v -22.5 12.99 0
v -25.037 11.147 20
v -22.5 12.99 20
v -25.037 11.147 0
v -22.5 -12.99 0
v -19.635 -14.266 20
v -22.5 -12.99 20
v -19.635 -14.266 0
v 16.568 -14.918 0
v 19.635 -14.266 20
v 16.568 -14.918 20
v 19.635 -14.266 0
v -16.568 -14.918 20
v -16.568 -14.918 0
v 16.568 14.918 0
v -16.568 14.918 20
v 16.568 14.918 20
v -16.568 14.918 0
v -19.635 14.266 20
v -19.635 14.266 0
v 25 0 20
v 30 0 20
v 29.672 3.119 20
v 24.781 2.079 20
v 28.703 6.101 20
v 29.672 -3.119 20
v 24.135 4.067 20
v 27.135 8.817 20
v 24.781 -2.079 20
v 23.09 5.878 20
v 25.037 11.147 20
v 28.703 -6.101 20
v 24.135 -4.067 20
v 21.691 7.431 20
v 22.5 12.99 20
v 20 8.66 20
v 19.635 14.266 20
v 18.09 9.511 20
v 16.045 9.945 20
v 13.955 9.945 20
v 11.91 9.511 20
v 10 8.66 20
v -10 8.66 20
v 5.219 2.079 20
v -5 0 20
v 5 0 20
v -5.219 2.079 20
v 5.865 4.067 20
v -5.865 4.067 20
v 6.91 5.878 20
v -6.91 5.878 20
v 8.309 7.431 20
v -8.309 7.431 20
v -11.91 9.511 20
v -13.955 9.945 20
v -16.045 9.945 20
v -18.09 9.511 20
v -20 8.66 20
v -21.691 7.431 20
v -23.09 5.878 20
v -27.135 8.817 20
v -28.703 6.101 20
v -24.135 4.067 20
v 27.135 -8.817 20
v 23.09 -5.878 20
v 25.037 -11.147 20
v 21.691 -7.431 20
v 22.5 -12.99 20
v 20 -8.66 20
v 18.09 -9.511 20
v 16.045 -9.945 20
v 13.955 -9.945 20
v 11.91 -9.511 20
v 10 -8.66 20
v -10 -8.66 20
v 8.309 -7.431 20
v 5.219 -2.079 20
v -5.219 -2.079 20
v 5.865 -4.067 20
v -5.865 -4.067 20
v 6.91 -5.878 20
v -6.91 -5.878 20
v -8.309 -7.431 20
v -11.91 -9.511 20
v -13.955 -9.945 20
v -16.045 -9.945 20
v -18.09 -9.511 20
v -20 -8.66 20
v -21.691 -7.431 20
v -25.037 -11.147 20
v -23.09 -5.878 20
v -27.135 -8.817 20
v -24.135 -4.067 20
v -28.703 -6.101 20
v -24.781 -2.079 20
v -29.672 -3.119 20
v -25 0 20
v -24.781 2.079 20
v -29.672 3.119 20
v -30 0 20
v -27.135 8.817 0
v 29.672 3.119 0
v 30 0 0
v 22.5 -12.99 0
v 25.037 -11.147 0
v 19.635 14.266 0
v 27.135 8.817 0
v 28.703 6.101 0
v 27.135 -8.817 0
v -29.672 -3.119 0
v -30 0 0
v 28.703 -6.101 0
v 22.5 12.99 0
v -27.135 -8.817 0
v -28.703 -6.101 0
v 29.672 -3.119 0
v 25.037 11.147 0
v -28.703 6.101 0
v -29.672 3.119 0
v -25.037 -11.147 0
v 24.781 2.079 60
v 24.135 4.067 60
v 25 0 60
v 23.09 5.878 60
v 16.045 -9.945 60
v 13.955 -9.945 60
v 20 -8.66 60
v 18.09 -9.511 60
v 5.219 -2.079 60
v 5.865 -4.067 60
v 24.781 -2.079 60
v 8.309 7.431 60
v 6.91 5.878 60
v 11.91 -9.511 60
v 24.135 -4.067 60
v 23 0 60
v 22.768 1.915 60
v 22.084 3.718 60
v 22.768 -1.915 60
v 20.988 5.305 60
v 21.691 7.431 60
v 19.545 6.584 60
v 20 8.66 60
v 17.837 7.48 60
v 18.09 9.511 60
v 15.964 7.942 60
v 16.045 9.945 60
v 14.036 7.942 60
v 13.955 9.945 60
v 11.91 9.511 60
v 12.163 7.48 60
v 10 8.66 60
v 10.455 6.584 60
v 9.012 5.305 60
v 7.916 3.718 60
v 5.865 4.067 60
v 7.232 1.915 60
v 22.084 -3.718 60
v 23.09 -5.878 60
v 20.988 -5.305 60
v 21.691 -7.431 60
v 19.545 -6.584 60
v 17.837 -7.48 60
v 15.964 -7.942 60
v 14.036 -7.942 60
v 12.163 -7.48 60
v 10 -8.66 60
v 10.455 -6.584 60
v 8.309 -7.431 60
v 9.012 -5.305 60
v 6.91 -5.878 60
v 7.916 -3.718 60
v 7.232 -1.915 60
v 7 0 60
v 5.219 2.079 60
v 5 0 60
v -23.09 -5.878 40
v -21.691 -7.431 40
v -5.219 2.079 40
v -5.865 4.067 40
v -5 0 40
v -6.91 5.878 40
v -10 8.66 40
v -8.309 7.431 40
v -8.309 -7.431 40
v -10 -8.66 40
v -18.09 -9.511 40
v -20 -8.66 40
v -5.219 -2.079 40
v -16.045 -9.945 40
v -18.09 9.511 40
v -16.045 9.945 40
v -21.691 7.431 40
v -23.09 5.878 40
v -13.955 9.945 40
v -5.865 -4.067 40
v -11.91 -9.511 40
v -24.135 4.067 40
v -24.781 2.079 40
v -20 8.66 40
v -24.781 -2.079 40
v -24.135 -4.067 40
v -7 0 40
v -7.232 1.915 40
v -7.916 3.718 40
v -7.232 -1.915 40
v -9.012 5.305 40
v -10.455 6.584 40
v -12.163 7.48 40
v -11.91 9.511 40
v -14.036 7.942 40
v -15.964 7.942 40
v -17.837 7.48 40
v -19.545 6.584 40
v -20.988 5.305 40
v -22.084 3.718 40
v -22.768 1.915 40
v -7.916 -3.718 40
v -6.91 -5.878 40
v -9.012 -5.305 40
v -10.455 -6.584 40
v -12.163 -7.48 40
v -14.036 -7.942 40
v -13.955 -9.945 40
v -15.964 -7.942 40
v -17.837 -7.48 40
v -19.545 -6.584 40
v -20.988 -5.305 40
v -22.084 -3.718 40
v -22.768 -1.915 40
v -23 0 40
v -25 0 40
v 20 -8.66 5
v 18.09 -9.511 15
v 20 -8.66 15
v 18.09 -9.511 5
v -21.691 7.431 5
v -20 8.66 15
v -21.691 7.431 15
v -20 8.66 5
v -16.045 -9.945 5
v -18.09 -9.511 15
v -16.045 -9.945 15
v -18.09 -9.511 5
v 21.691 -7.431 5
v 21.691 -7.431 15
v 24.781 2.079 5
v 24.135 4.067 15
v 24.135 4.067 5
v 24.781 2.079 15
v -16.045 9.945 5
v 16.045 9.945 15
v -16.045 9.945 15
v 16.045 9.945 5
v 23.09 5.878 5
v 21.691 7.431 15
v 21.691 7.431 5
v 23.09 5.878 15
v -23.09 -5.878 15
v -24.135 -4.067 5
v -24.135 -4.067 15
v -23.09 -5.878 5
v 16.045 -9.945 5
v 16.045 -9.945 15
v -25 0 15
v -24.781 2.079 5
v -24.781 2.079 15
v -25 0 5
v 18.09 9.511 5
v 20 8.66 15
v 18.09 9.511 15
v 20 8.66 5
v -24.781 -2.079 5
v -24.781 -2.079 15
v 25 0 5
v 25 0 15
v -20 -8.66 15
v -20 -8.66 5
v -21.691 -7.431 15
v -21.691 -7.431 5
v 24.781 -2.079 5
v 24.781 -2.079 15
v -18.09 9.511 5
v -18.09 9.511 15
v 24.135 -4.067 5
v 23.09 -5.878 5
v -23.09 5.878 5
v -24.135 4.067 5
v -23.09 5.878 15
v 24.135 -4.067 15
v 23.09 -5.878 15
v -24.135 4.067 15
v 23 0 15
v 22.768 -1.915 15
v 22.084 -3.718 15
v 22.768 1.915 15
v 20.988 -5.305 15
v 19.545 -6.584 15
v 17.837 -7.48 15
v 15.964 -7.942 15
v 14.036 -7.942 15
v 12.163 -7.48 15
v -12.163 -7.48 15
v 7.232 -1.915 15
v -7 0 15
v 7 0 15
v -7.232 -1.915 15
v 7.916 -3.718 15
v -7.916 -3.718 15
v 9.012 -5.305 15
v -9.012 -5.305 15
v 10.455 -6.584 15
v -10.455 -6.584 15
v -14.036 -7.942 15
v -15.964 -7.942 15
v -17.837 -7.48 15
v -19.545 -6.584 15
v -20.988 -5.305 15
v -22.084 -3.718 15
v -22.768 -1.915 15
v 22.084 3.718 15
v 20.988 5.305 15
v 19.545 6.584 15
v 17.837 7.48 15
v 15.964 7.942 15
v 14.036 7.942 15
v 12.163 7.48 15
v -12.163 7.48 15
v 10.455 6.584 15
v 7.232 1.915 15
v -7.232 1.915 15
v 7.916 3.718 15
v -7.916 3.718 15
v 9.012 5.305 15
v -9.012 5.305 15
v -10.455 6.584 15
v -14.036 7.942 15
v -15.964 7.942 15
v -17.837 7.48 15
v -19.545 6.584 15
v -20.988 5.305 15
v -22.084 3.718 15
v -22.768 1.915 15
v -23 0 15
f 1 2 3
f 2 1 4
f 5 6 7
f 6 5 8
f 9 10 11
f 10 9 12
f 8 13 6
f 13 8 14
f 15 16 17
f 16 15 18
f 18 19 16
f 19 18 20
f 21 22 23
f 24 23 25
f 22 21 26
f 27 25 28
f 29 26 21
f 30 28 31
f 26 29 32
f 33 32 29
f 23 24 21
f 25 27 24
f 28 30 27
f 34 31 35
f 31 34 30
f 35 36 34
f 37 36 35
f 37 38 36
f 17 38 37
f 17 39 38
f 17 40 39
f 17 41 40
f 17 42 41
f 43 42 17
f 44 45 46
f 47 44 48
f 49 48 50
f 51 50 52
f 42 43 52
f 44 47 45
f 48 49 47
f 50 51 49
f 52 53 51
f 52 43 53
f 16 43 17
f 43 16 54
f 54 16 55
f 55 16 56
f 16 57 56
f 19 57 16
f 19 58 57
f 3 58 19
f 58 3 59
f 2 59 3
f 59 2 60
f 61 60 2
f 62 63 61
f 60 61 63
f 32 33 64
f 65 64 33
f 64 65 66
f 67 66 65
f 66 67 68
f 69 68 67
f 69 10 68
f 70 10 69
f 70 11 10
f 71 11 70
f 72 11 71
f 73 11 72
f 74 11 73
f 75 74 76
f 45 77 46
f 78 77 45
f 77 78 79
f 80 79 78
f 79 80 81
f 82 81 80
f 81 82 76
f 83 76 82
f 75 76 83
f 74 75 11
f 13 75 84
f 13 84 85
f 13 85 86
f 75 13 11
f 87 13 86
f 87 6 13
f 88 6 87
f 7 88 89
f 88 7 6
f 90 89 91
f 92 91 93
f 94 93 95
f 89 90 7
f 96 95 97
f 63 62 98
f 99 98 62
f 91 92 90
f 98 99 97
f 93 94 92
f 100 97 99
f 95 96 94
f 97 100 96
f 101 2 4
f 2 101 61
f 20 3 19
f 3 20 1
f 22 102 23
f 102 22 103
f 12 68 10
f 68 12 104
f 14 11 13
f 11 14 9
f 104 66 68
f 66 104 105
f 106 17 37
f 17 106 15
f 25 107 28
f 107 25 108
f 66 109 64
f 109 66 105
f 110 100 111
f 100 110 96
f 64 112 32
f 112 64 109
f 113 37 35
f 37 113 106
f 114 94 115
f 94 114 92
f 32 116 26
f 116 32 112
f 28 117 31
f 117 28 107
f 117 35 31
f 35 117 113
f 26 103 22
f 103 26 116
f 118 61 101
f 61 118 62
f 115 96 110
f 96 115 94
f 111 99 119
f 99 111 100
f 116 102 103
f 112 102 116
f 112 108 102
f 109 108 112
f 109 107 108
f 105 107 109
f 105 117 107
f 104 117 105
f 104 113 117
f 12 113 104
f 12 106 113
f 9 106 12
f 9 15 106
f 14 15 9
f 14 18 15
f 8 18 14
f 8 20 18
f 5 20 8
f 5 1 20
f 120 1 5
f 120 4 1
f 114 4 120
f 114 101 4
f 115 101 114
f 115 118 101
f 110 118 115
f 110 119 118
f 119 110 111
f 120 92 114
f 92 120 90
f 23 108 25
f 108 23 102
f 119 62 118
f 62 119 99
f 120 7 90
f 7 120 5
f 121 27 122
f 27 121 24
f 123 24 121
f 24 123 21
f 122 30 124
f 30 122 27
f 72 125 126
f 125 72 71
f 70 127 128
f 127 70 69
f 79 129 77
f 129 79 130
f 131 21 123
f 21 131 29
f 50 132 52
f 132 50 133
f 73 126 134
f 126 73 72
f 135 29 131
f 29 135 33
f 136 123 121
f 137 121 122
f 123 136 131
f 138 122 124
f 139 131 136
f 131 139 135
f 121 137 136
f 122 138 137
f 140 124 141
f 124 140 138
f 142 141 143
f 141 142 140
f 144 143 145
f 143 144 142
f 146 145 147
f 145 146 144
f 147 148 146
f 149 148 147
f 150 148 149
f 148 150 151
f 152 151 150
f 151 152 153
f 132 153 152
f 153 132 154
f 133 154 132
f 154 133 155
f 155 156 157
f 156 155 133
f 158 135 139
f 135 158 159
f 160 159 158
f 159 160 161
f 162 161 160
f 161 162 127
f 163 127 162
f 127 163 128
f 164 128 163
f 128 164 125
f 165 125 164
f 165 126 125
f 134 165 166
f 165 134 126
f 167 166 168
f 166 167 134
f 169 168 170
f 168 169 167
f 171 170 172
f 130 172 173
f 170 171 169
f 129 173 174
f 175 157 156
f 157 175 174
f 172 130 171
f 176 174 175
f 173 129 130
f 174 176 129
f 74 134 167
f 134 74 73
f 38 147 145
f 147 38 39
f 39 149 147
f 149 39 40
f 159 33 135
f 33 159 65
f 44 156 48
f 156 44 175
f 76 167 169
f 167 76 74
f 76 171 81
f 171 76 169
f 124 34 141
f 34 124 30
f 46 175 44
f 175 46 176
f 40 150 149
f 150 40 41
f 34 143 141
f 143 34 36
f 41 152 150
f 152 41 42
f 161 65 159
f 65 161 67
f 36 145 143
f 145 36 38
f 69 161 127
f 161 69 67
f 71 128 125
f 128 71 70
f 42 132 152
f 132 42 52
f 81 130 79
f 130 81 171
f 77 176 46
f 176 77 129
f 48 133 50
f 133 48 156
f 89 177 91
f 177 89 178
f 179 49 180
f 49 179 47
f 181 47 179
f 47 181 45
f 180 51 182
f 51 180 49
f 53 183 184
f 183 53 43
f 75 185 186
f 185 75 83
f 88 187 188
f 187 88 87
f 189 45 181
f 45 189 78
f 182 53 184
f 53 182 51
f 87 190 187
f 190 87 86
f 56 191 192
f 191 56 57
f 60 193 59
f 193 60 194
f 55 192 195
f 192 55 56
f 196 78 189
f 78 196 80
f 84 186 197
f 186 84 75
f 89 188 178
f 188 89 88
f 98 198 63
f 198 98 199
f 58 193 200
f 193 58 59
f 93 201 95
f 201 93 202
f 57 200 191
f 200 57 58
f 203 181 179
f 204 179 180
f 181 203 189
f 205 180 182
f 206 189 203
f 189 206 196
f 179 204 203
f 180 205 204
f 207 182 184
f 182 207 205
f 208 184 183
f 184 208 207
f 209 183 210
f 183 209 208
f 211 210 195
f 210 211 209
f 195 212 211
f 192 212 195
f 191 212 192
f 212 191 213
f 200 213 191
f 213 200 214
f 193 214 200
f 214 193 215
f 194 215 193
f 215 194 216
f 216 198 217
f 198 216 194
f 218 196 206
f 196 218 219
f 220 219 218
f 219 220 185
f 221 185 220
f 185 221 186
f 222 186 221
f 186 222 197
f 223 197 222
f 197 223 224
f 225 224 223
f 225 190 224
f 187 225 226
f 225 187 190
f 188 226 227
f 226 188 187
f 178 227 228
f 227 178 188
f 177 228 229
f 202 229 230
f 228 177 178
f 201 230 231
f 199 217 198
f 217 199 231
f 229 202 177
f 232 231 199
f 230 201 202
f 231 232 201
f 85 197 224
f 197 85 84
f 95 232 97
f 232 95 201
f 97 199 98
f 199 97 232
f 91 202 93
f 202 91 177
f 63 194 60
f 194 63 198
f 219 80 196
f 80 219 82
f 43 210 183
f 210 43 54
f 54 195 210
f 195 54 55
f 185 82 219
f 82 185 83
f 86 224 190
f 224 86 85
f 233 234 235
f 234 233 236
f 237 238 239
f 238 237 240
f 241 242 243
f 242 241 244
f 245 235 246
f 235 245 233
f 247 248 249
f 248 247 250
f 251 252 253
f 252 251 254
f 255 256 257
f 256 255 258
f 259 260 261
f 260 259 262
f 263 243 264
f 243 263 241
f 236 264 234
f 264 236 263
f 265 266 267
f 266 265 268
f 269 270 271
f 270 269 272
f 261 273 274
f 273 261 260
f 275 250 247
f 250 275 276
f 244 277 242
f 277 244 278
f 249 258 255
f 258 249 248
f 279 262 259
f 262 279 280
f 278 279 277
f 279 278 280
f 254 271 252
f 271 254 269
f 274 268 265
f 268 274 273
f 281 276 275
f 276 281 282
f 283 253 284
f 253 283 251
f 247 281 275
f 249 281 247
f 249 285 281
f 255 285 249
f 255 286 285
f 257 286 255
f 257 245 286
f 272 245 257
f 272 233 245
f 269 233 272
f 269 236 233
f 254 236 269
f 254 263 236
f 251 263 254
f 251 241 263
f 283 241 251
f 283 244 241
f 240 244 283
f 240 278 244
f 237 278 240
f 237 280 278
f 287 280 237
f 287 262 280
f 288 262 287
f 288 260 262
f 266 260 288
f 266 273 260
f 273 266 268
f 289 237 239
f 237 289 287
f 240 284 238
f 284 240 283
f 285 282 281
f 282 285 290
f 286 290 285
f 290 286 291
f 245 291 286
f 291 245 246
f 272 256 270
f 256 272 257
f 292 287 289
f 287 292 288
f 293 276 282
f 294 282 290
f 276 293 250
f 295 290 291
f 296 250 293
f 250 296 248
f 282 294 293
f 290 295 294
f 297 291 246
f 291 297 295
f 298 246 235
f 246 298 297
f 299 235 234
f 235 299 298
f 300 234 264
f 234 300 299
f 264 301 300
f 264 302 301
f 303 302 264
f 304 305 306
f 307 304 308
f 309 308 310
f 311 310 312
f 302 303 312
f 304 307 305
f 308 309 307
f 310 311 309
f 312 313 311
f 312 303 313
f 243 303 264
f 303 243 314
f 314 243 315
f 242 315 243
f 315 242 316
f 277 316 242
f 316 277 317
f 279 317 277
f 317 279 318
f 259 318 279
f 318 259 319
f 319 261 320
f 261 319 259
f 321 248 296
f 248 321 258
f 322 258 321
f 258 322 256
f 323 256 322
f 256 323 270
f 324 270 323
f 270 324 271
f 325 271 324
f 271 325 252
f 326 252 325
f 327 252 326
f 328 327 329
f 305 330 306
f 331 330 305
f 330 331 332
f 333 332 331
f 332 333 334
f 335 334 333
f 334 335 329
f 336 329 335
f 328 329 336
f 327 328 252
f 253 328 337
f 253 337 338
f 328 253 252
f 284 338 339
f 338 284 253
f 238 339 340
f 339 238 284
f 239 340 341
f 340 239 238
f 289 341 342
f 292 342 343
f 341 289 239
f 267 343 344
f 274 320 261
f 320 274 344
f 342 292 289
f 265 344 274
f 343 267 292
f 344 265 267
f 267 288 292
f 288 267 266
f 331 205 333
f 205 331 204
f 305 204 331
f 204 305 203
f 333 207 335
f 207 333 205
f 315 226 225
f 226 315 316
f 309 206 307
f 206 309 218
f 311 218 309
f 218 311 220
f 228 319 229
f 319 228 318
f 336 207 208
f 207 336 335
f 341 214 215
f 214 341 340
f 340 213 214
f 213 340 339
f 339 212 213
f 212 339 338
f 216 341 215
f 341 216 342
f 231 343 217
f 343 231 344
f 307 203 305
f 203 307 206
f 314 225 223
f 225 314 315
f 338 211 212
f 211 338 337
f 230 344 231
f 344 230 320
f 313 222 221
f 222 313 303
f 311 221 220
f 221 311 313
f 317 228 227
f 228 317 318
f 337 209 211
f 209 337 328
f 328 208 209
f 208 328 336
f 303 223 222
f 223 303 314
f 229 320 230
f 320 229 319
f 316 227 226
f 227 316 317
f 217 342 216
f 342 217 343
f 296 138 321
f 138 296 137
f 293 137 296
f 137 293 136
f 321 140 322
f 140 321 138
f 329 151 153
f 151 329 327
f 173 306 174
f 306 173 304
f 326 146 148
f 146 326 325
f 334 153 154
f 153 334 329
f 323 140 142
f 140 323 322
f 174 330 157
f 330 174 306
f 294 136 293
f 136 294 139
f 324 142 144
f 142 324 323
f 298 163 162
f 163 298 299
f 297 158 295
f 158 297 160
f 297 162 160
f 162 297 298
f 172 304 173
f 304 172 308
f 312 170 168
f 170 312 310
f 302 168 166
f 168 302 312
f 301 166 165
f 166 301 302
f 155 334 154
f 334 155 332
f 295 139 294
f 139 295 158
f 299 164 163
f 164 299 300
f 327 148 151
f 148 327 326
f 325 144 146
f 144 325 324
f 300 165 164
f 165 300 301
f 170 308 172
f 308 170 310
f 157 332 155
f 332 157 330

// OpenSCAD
chamberheight = 20;
chamberwall = 5;
chamberinnerheight = chamberheight - 2 * chamberwall;

difference(){
  union()
  {
    hull()
    {
      translate([-15, 0, 0]) {
        cylinder(h=chamberheight, r=15);
      }
      translate([15, 0, 0]) {
        cylinder(h=chamberheight, r=15);
      }
    }
    
    translate([15, 0, chamberheight]) {
      cylinder(h=40, r=10);
    }

    translate([-15, 0, chamberheight]) {
      cylinder(h=20, r=10);
    }
  }

  translate([0, 0, chamberwall]){
    union(){
      hull()
      {
        translate([-15, 0, 0]) {
          cylinder(h=chamberinnerheight, r=10);
        }
        translate([15, 0, 0]) {
          cylinder(h=chamberinnerheight, r=10);
        }
      }

      translate([-15 ,0 ,0]) {
        cylinder(h=chamberheight + 40, r=8);
      }

      translate([15, 0, 0]) {
        cylinder(h=chamberheight + 40, r=8);
      }
    }
  }
}
